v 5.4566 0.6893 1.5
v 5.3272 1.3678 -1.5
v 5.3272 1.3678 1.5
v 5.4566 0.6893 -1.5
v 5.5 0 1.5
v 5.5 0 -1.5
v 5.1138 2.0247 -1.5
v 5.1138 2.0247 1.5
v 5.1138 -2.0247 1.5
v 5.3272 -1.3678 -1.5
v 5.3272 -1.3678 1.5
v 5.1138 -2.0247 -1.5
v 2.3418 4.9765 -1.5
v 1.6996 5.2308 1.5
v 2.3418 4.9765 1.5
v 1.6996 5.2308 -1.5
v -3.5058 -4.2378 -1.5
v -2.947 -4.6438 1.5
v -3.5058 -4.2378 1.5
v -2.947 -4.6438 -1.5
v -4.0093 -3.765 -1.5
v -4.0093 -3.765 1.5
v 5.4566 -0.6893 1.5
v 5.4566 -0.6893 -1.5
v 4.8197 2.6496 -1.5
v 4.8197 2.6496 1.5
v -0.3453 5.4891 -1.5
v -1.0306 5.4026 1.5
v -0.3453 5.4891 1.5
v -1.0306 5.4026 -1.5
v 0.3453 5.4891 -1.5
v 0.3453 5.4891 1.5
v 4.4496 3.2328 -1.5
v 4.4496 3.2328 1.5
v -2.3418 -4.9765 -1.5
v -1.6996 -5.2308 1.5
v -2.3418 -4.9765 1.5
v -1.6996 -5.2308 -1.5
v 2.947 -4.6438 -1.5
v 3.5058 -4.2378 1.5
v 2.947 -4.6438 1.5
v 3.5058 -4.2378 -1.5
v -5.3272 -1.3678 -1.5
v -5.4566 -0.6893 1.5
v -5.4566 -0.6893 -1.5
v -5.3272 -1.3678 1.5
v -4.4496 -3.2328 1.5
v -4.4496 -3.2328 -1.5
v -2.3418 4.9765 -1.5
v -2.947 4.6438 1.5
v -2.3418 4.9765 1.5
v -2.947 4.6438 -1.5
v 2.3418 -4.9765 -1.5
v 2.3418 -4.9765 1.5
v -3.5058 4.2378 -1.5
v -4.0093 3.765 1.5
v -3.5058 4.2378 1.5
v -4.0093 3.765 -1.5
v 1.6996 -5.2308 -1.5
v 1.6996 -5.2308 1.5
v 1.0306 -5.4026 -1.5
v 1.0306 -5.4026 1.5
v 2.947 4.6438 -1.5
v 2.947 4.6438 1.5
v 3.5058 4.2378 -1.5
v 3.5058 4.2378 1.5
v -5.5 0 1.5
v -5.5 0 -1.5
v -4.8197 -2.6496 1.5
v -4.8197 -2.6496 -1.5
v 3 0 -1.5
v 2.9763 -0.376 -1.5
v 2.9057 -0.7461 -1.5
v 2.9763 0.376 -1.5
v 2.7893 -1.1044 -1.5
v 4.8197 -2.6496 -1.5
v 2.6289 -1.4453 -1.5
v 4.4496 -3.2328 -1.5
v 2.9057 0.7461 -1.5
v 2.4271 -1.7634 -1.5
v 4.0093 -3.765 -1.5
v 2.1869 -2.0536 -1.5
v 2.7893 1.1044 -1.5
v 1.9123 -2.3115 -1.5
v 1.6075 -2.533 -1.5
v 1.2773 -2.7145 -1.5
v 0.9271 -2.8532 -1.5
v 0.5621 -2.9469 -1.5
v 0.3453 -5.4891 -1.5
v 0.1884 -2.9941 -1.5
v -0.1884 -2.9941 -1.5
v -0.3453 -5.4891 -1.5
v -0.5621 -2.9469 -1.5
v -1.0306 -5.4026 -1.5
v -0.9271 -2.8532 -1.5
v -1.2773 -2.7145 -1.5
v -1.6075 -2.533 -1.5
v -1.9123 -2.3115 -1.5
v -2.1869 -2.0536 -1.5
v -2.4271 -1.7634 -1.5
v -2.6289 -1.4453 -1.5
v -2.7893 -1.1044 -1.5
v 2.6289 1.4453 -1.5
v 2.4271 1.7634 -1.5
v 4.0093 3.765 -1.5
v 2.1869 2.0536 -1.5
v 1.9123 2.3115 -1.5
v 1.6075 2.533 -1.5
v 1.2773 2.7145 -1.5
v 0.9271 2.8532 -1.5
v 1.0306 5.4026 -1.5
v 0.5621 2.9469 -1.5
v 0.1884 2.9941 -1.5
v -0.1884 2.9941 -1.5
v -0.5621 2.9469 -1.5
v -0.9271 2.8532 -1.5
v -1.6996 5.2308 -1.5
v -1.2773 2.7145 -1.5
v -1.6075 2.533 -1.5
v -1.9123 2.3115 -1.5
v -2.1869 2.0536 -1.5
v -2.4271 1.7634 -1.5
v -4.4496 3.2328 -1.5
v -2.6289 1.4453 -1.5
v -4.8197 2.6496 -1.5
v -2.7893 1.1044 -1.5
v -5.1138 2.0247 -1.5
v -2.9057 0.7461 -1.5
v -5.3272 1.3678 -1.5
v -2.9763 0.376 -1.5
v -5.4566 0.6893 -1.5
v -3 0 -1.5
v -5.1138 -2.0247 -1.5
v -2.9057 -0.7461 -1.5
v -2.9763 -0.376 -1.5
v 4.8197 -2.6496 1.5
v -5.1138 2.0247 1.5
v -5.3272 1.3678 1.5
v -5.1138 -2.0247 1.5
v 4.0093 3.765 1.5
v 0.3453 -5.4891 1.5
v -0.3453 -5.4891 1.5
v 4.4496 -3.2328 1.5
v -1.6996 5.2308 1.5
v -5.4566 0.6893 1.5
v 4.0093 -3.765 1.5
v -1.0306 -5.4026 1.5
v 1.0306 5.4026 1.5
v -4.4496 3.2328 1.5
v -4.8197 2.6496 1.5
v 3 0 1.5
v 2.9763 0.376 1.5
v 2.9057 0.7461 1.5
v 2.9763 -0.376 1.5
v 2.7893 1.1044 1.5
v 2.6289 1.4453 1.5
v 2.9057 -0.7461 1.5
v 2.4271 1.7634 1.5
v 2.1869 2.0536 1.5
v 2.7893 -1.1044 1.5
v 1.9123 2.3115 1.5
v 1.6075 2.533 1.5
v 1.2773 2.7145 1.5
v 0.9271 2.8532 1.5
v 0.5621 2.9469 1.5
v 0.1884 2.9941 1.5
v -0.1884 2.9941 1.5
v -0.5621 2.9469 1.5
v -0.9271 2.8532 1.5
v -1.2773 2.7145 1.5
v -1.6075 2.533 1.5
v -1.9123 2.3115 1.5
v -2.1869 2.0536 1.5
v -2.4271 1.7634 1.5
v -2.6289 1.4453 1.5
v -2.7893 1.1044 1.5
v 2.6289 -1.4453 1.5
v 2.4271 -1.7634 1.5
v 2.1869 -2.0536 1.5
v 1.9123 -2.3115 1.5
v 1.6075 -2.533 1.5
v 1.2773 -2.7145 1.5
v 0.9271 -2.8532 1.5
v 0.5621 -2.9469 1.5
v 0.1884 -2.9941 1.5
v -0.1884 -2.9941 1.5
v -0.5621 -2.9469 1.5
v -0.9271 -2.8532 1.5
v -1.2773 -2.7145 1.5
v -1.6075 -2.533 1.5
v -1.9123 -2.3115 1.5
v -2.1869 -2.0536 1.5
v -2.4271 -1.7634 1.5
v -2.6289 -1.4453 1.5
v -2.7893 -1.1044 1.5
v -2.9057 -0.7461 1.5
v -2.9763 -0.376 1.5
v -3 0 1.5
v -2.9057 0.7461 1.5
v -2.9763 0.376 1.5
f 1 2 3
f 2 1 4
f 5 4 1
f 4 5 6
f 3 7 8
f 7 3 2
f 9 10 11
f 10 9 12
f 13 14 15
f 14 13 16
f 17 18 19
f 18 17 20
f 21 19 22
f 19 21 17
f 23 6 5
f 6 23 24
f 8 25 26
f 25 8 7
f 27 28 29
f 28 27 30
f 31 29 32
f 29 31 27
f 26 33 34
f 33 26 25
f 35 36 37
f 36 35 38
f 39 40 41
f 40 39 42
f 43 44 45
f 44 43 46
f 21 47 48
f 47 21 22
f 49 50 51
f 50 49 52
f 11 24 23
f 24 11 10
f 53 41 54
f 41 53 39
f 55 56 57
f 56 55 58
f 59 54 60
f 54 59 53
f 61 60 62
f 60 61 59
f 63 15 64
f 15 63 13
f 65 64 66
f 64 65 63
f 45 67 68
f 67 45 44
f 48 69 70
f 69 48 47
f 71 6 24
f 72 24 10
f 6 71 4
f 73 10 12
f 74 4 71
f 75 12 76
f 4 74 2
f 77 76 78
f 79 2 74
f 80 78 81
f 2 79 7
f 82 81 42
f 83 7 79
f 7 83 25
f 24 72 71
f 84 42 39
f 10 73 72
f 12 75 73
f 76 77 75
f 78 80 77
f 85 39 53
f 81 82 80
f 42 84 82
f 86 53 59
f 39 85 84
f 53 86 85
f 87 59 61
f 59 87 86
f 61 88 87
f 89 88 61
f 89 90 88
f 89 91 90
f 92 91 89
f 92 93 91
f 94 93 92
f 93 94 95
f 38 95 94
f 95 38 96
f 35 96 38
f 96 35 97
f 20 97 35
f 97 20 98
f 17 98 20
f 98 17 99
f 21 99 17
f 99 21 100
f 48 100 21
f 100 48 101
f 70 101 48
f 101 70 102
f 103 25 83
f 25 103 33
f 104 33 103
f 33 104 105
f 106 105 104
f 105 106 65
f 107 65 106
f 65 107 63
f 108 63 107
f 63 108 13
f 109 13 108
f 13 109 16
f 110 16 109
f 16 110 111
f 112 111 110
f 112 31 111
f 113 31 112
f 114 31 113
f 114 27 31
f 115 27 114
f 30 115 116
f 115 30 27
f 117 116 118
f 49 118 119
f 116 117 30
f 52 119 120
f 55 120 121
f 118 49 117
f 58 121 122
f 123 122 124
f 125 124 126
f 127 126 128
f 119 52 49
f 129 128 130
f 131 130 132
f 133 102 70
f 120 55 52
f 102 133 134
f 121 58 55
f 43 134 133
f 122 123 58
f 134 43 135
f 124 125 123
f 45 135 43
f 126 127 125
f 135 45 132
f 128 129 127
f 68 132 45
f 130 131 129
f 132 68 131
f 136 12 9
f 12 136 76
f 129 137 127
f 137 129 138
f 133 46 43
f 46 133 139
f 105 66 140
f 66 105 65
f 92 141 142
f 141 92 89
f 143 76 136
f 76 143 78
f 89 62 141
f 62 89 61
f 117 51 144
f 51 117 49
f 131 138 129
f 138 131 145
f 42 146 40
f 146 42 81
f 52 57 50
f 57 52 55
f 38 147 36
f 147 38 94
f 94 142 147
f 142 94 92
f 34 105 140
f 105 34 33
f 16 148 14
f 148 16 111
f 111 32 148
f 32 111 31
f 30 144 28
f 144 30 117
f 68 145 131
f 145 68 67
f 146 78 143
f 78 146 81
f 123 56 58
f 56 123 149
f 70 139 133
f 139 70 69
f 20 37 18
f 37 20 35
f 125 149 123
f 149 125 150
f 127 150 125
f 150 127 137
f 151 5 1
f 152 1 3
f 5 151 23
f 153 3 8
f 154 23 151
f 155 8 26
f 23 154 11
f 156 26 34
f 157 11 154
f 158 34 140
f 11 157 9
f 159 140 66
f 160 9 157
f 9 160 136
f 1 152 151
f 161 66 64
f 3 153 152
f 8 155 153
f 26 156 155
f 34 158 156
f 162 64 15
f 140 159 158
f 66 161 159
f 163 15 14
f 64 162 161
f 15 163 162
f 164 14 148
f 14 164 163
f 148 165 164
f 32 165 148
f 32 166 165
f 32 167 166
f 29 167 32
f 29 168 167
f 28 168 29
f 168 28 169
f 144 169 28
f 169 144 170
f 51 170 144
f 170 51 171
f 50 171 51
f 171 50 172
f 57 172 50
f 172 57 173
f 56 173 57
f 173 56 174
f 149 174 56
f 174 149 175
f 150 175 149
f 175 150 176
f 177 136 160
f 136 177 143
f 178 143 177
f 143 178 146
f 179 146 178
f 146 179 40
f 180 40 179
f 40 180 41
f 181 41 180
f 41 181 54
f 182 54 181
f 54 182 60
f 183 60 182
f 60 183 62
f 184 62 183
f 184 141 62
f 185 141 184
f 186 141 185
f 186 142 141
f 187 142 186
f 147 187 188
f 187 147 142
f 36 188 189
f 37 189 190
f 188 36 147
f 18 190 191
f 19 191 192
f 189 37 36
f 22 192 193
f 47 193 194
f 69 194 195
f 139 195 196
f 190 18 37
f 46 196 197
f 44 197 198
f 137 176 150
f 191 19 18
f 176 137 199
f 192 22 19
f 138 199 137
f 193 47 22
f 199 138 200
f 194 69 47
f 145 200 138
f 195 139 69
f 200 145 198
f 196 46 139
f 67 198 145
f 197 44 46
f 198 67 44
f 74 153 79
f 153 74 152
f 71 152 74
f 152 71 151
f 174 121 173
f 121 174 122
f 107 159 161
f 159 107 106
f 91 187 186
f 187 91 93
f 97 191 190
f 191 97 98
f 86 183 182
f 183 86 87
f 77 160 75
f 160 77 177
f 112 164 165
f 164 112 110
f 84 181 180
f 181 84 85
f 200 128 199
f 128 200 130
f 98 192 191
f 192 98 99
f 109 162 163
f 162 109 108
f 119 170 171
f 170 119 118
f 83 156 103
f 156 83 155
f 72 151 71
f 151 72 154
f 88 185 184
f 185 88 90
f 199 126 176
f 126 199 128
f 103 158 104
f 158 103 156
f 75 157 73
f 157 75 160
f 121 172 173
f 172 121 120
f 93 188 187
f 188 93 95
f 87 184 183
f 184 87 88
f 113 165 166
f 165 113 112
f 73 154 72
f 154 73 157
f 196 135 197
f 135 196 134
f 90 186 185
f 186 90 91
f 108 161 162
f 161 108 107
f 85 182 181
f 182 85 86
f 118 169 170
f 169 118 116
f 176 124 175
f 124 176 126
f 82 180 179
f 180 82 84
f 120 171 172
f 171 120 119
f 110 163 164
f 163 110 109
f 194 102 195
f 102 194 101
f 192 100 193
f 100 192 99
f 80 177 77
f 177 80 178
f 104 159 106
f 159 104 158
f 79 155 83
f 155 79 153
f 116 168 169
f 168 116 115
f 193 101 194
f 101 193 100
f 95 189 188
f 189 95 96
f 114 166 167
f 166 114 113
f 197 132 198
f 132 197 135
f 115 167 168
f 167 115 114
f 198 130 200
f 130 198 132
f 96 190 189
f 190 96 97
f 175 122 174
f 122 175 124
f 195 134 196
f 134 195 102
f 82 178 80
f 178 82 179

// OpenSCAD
$fn = 50;


difference() {
	union() {
		translate(v = [0, 0, -1.5000000000]) {
			cylinder(h = 3, r = 5.5000000000);
		}
	}
	union() {
		translate(v = [0, 0, -100.0000000000]) {
			cylinder(h = 200, r = 3.0000000000);
		}
	}
}
